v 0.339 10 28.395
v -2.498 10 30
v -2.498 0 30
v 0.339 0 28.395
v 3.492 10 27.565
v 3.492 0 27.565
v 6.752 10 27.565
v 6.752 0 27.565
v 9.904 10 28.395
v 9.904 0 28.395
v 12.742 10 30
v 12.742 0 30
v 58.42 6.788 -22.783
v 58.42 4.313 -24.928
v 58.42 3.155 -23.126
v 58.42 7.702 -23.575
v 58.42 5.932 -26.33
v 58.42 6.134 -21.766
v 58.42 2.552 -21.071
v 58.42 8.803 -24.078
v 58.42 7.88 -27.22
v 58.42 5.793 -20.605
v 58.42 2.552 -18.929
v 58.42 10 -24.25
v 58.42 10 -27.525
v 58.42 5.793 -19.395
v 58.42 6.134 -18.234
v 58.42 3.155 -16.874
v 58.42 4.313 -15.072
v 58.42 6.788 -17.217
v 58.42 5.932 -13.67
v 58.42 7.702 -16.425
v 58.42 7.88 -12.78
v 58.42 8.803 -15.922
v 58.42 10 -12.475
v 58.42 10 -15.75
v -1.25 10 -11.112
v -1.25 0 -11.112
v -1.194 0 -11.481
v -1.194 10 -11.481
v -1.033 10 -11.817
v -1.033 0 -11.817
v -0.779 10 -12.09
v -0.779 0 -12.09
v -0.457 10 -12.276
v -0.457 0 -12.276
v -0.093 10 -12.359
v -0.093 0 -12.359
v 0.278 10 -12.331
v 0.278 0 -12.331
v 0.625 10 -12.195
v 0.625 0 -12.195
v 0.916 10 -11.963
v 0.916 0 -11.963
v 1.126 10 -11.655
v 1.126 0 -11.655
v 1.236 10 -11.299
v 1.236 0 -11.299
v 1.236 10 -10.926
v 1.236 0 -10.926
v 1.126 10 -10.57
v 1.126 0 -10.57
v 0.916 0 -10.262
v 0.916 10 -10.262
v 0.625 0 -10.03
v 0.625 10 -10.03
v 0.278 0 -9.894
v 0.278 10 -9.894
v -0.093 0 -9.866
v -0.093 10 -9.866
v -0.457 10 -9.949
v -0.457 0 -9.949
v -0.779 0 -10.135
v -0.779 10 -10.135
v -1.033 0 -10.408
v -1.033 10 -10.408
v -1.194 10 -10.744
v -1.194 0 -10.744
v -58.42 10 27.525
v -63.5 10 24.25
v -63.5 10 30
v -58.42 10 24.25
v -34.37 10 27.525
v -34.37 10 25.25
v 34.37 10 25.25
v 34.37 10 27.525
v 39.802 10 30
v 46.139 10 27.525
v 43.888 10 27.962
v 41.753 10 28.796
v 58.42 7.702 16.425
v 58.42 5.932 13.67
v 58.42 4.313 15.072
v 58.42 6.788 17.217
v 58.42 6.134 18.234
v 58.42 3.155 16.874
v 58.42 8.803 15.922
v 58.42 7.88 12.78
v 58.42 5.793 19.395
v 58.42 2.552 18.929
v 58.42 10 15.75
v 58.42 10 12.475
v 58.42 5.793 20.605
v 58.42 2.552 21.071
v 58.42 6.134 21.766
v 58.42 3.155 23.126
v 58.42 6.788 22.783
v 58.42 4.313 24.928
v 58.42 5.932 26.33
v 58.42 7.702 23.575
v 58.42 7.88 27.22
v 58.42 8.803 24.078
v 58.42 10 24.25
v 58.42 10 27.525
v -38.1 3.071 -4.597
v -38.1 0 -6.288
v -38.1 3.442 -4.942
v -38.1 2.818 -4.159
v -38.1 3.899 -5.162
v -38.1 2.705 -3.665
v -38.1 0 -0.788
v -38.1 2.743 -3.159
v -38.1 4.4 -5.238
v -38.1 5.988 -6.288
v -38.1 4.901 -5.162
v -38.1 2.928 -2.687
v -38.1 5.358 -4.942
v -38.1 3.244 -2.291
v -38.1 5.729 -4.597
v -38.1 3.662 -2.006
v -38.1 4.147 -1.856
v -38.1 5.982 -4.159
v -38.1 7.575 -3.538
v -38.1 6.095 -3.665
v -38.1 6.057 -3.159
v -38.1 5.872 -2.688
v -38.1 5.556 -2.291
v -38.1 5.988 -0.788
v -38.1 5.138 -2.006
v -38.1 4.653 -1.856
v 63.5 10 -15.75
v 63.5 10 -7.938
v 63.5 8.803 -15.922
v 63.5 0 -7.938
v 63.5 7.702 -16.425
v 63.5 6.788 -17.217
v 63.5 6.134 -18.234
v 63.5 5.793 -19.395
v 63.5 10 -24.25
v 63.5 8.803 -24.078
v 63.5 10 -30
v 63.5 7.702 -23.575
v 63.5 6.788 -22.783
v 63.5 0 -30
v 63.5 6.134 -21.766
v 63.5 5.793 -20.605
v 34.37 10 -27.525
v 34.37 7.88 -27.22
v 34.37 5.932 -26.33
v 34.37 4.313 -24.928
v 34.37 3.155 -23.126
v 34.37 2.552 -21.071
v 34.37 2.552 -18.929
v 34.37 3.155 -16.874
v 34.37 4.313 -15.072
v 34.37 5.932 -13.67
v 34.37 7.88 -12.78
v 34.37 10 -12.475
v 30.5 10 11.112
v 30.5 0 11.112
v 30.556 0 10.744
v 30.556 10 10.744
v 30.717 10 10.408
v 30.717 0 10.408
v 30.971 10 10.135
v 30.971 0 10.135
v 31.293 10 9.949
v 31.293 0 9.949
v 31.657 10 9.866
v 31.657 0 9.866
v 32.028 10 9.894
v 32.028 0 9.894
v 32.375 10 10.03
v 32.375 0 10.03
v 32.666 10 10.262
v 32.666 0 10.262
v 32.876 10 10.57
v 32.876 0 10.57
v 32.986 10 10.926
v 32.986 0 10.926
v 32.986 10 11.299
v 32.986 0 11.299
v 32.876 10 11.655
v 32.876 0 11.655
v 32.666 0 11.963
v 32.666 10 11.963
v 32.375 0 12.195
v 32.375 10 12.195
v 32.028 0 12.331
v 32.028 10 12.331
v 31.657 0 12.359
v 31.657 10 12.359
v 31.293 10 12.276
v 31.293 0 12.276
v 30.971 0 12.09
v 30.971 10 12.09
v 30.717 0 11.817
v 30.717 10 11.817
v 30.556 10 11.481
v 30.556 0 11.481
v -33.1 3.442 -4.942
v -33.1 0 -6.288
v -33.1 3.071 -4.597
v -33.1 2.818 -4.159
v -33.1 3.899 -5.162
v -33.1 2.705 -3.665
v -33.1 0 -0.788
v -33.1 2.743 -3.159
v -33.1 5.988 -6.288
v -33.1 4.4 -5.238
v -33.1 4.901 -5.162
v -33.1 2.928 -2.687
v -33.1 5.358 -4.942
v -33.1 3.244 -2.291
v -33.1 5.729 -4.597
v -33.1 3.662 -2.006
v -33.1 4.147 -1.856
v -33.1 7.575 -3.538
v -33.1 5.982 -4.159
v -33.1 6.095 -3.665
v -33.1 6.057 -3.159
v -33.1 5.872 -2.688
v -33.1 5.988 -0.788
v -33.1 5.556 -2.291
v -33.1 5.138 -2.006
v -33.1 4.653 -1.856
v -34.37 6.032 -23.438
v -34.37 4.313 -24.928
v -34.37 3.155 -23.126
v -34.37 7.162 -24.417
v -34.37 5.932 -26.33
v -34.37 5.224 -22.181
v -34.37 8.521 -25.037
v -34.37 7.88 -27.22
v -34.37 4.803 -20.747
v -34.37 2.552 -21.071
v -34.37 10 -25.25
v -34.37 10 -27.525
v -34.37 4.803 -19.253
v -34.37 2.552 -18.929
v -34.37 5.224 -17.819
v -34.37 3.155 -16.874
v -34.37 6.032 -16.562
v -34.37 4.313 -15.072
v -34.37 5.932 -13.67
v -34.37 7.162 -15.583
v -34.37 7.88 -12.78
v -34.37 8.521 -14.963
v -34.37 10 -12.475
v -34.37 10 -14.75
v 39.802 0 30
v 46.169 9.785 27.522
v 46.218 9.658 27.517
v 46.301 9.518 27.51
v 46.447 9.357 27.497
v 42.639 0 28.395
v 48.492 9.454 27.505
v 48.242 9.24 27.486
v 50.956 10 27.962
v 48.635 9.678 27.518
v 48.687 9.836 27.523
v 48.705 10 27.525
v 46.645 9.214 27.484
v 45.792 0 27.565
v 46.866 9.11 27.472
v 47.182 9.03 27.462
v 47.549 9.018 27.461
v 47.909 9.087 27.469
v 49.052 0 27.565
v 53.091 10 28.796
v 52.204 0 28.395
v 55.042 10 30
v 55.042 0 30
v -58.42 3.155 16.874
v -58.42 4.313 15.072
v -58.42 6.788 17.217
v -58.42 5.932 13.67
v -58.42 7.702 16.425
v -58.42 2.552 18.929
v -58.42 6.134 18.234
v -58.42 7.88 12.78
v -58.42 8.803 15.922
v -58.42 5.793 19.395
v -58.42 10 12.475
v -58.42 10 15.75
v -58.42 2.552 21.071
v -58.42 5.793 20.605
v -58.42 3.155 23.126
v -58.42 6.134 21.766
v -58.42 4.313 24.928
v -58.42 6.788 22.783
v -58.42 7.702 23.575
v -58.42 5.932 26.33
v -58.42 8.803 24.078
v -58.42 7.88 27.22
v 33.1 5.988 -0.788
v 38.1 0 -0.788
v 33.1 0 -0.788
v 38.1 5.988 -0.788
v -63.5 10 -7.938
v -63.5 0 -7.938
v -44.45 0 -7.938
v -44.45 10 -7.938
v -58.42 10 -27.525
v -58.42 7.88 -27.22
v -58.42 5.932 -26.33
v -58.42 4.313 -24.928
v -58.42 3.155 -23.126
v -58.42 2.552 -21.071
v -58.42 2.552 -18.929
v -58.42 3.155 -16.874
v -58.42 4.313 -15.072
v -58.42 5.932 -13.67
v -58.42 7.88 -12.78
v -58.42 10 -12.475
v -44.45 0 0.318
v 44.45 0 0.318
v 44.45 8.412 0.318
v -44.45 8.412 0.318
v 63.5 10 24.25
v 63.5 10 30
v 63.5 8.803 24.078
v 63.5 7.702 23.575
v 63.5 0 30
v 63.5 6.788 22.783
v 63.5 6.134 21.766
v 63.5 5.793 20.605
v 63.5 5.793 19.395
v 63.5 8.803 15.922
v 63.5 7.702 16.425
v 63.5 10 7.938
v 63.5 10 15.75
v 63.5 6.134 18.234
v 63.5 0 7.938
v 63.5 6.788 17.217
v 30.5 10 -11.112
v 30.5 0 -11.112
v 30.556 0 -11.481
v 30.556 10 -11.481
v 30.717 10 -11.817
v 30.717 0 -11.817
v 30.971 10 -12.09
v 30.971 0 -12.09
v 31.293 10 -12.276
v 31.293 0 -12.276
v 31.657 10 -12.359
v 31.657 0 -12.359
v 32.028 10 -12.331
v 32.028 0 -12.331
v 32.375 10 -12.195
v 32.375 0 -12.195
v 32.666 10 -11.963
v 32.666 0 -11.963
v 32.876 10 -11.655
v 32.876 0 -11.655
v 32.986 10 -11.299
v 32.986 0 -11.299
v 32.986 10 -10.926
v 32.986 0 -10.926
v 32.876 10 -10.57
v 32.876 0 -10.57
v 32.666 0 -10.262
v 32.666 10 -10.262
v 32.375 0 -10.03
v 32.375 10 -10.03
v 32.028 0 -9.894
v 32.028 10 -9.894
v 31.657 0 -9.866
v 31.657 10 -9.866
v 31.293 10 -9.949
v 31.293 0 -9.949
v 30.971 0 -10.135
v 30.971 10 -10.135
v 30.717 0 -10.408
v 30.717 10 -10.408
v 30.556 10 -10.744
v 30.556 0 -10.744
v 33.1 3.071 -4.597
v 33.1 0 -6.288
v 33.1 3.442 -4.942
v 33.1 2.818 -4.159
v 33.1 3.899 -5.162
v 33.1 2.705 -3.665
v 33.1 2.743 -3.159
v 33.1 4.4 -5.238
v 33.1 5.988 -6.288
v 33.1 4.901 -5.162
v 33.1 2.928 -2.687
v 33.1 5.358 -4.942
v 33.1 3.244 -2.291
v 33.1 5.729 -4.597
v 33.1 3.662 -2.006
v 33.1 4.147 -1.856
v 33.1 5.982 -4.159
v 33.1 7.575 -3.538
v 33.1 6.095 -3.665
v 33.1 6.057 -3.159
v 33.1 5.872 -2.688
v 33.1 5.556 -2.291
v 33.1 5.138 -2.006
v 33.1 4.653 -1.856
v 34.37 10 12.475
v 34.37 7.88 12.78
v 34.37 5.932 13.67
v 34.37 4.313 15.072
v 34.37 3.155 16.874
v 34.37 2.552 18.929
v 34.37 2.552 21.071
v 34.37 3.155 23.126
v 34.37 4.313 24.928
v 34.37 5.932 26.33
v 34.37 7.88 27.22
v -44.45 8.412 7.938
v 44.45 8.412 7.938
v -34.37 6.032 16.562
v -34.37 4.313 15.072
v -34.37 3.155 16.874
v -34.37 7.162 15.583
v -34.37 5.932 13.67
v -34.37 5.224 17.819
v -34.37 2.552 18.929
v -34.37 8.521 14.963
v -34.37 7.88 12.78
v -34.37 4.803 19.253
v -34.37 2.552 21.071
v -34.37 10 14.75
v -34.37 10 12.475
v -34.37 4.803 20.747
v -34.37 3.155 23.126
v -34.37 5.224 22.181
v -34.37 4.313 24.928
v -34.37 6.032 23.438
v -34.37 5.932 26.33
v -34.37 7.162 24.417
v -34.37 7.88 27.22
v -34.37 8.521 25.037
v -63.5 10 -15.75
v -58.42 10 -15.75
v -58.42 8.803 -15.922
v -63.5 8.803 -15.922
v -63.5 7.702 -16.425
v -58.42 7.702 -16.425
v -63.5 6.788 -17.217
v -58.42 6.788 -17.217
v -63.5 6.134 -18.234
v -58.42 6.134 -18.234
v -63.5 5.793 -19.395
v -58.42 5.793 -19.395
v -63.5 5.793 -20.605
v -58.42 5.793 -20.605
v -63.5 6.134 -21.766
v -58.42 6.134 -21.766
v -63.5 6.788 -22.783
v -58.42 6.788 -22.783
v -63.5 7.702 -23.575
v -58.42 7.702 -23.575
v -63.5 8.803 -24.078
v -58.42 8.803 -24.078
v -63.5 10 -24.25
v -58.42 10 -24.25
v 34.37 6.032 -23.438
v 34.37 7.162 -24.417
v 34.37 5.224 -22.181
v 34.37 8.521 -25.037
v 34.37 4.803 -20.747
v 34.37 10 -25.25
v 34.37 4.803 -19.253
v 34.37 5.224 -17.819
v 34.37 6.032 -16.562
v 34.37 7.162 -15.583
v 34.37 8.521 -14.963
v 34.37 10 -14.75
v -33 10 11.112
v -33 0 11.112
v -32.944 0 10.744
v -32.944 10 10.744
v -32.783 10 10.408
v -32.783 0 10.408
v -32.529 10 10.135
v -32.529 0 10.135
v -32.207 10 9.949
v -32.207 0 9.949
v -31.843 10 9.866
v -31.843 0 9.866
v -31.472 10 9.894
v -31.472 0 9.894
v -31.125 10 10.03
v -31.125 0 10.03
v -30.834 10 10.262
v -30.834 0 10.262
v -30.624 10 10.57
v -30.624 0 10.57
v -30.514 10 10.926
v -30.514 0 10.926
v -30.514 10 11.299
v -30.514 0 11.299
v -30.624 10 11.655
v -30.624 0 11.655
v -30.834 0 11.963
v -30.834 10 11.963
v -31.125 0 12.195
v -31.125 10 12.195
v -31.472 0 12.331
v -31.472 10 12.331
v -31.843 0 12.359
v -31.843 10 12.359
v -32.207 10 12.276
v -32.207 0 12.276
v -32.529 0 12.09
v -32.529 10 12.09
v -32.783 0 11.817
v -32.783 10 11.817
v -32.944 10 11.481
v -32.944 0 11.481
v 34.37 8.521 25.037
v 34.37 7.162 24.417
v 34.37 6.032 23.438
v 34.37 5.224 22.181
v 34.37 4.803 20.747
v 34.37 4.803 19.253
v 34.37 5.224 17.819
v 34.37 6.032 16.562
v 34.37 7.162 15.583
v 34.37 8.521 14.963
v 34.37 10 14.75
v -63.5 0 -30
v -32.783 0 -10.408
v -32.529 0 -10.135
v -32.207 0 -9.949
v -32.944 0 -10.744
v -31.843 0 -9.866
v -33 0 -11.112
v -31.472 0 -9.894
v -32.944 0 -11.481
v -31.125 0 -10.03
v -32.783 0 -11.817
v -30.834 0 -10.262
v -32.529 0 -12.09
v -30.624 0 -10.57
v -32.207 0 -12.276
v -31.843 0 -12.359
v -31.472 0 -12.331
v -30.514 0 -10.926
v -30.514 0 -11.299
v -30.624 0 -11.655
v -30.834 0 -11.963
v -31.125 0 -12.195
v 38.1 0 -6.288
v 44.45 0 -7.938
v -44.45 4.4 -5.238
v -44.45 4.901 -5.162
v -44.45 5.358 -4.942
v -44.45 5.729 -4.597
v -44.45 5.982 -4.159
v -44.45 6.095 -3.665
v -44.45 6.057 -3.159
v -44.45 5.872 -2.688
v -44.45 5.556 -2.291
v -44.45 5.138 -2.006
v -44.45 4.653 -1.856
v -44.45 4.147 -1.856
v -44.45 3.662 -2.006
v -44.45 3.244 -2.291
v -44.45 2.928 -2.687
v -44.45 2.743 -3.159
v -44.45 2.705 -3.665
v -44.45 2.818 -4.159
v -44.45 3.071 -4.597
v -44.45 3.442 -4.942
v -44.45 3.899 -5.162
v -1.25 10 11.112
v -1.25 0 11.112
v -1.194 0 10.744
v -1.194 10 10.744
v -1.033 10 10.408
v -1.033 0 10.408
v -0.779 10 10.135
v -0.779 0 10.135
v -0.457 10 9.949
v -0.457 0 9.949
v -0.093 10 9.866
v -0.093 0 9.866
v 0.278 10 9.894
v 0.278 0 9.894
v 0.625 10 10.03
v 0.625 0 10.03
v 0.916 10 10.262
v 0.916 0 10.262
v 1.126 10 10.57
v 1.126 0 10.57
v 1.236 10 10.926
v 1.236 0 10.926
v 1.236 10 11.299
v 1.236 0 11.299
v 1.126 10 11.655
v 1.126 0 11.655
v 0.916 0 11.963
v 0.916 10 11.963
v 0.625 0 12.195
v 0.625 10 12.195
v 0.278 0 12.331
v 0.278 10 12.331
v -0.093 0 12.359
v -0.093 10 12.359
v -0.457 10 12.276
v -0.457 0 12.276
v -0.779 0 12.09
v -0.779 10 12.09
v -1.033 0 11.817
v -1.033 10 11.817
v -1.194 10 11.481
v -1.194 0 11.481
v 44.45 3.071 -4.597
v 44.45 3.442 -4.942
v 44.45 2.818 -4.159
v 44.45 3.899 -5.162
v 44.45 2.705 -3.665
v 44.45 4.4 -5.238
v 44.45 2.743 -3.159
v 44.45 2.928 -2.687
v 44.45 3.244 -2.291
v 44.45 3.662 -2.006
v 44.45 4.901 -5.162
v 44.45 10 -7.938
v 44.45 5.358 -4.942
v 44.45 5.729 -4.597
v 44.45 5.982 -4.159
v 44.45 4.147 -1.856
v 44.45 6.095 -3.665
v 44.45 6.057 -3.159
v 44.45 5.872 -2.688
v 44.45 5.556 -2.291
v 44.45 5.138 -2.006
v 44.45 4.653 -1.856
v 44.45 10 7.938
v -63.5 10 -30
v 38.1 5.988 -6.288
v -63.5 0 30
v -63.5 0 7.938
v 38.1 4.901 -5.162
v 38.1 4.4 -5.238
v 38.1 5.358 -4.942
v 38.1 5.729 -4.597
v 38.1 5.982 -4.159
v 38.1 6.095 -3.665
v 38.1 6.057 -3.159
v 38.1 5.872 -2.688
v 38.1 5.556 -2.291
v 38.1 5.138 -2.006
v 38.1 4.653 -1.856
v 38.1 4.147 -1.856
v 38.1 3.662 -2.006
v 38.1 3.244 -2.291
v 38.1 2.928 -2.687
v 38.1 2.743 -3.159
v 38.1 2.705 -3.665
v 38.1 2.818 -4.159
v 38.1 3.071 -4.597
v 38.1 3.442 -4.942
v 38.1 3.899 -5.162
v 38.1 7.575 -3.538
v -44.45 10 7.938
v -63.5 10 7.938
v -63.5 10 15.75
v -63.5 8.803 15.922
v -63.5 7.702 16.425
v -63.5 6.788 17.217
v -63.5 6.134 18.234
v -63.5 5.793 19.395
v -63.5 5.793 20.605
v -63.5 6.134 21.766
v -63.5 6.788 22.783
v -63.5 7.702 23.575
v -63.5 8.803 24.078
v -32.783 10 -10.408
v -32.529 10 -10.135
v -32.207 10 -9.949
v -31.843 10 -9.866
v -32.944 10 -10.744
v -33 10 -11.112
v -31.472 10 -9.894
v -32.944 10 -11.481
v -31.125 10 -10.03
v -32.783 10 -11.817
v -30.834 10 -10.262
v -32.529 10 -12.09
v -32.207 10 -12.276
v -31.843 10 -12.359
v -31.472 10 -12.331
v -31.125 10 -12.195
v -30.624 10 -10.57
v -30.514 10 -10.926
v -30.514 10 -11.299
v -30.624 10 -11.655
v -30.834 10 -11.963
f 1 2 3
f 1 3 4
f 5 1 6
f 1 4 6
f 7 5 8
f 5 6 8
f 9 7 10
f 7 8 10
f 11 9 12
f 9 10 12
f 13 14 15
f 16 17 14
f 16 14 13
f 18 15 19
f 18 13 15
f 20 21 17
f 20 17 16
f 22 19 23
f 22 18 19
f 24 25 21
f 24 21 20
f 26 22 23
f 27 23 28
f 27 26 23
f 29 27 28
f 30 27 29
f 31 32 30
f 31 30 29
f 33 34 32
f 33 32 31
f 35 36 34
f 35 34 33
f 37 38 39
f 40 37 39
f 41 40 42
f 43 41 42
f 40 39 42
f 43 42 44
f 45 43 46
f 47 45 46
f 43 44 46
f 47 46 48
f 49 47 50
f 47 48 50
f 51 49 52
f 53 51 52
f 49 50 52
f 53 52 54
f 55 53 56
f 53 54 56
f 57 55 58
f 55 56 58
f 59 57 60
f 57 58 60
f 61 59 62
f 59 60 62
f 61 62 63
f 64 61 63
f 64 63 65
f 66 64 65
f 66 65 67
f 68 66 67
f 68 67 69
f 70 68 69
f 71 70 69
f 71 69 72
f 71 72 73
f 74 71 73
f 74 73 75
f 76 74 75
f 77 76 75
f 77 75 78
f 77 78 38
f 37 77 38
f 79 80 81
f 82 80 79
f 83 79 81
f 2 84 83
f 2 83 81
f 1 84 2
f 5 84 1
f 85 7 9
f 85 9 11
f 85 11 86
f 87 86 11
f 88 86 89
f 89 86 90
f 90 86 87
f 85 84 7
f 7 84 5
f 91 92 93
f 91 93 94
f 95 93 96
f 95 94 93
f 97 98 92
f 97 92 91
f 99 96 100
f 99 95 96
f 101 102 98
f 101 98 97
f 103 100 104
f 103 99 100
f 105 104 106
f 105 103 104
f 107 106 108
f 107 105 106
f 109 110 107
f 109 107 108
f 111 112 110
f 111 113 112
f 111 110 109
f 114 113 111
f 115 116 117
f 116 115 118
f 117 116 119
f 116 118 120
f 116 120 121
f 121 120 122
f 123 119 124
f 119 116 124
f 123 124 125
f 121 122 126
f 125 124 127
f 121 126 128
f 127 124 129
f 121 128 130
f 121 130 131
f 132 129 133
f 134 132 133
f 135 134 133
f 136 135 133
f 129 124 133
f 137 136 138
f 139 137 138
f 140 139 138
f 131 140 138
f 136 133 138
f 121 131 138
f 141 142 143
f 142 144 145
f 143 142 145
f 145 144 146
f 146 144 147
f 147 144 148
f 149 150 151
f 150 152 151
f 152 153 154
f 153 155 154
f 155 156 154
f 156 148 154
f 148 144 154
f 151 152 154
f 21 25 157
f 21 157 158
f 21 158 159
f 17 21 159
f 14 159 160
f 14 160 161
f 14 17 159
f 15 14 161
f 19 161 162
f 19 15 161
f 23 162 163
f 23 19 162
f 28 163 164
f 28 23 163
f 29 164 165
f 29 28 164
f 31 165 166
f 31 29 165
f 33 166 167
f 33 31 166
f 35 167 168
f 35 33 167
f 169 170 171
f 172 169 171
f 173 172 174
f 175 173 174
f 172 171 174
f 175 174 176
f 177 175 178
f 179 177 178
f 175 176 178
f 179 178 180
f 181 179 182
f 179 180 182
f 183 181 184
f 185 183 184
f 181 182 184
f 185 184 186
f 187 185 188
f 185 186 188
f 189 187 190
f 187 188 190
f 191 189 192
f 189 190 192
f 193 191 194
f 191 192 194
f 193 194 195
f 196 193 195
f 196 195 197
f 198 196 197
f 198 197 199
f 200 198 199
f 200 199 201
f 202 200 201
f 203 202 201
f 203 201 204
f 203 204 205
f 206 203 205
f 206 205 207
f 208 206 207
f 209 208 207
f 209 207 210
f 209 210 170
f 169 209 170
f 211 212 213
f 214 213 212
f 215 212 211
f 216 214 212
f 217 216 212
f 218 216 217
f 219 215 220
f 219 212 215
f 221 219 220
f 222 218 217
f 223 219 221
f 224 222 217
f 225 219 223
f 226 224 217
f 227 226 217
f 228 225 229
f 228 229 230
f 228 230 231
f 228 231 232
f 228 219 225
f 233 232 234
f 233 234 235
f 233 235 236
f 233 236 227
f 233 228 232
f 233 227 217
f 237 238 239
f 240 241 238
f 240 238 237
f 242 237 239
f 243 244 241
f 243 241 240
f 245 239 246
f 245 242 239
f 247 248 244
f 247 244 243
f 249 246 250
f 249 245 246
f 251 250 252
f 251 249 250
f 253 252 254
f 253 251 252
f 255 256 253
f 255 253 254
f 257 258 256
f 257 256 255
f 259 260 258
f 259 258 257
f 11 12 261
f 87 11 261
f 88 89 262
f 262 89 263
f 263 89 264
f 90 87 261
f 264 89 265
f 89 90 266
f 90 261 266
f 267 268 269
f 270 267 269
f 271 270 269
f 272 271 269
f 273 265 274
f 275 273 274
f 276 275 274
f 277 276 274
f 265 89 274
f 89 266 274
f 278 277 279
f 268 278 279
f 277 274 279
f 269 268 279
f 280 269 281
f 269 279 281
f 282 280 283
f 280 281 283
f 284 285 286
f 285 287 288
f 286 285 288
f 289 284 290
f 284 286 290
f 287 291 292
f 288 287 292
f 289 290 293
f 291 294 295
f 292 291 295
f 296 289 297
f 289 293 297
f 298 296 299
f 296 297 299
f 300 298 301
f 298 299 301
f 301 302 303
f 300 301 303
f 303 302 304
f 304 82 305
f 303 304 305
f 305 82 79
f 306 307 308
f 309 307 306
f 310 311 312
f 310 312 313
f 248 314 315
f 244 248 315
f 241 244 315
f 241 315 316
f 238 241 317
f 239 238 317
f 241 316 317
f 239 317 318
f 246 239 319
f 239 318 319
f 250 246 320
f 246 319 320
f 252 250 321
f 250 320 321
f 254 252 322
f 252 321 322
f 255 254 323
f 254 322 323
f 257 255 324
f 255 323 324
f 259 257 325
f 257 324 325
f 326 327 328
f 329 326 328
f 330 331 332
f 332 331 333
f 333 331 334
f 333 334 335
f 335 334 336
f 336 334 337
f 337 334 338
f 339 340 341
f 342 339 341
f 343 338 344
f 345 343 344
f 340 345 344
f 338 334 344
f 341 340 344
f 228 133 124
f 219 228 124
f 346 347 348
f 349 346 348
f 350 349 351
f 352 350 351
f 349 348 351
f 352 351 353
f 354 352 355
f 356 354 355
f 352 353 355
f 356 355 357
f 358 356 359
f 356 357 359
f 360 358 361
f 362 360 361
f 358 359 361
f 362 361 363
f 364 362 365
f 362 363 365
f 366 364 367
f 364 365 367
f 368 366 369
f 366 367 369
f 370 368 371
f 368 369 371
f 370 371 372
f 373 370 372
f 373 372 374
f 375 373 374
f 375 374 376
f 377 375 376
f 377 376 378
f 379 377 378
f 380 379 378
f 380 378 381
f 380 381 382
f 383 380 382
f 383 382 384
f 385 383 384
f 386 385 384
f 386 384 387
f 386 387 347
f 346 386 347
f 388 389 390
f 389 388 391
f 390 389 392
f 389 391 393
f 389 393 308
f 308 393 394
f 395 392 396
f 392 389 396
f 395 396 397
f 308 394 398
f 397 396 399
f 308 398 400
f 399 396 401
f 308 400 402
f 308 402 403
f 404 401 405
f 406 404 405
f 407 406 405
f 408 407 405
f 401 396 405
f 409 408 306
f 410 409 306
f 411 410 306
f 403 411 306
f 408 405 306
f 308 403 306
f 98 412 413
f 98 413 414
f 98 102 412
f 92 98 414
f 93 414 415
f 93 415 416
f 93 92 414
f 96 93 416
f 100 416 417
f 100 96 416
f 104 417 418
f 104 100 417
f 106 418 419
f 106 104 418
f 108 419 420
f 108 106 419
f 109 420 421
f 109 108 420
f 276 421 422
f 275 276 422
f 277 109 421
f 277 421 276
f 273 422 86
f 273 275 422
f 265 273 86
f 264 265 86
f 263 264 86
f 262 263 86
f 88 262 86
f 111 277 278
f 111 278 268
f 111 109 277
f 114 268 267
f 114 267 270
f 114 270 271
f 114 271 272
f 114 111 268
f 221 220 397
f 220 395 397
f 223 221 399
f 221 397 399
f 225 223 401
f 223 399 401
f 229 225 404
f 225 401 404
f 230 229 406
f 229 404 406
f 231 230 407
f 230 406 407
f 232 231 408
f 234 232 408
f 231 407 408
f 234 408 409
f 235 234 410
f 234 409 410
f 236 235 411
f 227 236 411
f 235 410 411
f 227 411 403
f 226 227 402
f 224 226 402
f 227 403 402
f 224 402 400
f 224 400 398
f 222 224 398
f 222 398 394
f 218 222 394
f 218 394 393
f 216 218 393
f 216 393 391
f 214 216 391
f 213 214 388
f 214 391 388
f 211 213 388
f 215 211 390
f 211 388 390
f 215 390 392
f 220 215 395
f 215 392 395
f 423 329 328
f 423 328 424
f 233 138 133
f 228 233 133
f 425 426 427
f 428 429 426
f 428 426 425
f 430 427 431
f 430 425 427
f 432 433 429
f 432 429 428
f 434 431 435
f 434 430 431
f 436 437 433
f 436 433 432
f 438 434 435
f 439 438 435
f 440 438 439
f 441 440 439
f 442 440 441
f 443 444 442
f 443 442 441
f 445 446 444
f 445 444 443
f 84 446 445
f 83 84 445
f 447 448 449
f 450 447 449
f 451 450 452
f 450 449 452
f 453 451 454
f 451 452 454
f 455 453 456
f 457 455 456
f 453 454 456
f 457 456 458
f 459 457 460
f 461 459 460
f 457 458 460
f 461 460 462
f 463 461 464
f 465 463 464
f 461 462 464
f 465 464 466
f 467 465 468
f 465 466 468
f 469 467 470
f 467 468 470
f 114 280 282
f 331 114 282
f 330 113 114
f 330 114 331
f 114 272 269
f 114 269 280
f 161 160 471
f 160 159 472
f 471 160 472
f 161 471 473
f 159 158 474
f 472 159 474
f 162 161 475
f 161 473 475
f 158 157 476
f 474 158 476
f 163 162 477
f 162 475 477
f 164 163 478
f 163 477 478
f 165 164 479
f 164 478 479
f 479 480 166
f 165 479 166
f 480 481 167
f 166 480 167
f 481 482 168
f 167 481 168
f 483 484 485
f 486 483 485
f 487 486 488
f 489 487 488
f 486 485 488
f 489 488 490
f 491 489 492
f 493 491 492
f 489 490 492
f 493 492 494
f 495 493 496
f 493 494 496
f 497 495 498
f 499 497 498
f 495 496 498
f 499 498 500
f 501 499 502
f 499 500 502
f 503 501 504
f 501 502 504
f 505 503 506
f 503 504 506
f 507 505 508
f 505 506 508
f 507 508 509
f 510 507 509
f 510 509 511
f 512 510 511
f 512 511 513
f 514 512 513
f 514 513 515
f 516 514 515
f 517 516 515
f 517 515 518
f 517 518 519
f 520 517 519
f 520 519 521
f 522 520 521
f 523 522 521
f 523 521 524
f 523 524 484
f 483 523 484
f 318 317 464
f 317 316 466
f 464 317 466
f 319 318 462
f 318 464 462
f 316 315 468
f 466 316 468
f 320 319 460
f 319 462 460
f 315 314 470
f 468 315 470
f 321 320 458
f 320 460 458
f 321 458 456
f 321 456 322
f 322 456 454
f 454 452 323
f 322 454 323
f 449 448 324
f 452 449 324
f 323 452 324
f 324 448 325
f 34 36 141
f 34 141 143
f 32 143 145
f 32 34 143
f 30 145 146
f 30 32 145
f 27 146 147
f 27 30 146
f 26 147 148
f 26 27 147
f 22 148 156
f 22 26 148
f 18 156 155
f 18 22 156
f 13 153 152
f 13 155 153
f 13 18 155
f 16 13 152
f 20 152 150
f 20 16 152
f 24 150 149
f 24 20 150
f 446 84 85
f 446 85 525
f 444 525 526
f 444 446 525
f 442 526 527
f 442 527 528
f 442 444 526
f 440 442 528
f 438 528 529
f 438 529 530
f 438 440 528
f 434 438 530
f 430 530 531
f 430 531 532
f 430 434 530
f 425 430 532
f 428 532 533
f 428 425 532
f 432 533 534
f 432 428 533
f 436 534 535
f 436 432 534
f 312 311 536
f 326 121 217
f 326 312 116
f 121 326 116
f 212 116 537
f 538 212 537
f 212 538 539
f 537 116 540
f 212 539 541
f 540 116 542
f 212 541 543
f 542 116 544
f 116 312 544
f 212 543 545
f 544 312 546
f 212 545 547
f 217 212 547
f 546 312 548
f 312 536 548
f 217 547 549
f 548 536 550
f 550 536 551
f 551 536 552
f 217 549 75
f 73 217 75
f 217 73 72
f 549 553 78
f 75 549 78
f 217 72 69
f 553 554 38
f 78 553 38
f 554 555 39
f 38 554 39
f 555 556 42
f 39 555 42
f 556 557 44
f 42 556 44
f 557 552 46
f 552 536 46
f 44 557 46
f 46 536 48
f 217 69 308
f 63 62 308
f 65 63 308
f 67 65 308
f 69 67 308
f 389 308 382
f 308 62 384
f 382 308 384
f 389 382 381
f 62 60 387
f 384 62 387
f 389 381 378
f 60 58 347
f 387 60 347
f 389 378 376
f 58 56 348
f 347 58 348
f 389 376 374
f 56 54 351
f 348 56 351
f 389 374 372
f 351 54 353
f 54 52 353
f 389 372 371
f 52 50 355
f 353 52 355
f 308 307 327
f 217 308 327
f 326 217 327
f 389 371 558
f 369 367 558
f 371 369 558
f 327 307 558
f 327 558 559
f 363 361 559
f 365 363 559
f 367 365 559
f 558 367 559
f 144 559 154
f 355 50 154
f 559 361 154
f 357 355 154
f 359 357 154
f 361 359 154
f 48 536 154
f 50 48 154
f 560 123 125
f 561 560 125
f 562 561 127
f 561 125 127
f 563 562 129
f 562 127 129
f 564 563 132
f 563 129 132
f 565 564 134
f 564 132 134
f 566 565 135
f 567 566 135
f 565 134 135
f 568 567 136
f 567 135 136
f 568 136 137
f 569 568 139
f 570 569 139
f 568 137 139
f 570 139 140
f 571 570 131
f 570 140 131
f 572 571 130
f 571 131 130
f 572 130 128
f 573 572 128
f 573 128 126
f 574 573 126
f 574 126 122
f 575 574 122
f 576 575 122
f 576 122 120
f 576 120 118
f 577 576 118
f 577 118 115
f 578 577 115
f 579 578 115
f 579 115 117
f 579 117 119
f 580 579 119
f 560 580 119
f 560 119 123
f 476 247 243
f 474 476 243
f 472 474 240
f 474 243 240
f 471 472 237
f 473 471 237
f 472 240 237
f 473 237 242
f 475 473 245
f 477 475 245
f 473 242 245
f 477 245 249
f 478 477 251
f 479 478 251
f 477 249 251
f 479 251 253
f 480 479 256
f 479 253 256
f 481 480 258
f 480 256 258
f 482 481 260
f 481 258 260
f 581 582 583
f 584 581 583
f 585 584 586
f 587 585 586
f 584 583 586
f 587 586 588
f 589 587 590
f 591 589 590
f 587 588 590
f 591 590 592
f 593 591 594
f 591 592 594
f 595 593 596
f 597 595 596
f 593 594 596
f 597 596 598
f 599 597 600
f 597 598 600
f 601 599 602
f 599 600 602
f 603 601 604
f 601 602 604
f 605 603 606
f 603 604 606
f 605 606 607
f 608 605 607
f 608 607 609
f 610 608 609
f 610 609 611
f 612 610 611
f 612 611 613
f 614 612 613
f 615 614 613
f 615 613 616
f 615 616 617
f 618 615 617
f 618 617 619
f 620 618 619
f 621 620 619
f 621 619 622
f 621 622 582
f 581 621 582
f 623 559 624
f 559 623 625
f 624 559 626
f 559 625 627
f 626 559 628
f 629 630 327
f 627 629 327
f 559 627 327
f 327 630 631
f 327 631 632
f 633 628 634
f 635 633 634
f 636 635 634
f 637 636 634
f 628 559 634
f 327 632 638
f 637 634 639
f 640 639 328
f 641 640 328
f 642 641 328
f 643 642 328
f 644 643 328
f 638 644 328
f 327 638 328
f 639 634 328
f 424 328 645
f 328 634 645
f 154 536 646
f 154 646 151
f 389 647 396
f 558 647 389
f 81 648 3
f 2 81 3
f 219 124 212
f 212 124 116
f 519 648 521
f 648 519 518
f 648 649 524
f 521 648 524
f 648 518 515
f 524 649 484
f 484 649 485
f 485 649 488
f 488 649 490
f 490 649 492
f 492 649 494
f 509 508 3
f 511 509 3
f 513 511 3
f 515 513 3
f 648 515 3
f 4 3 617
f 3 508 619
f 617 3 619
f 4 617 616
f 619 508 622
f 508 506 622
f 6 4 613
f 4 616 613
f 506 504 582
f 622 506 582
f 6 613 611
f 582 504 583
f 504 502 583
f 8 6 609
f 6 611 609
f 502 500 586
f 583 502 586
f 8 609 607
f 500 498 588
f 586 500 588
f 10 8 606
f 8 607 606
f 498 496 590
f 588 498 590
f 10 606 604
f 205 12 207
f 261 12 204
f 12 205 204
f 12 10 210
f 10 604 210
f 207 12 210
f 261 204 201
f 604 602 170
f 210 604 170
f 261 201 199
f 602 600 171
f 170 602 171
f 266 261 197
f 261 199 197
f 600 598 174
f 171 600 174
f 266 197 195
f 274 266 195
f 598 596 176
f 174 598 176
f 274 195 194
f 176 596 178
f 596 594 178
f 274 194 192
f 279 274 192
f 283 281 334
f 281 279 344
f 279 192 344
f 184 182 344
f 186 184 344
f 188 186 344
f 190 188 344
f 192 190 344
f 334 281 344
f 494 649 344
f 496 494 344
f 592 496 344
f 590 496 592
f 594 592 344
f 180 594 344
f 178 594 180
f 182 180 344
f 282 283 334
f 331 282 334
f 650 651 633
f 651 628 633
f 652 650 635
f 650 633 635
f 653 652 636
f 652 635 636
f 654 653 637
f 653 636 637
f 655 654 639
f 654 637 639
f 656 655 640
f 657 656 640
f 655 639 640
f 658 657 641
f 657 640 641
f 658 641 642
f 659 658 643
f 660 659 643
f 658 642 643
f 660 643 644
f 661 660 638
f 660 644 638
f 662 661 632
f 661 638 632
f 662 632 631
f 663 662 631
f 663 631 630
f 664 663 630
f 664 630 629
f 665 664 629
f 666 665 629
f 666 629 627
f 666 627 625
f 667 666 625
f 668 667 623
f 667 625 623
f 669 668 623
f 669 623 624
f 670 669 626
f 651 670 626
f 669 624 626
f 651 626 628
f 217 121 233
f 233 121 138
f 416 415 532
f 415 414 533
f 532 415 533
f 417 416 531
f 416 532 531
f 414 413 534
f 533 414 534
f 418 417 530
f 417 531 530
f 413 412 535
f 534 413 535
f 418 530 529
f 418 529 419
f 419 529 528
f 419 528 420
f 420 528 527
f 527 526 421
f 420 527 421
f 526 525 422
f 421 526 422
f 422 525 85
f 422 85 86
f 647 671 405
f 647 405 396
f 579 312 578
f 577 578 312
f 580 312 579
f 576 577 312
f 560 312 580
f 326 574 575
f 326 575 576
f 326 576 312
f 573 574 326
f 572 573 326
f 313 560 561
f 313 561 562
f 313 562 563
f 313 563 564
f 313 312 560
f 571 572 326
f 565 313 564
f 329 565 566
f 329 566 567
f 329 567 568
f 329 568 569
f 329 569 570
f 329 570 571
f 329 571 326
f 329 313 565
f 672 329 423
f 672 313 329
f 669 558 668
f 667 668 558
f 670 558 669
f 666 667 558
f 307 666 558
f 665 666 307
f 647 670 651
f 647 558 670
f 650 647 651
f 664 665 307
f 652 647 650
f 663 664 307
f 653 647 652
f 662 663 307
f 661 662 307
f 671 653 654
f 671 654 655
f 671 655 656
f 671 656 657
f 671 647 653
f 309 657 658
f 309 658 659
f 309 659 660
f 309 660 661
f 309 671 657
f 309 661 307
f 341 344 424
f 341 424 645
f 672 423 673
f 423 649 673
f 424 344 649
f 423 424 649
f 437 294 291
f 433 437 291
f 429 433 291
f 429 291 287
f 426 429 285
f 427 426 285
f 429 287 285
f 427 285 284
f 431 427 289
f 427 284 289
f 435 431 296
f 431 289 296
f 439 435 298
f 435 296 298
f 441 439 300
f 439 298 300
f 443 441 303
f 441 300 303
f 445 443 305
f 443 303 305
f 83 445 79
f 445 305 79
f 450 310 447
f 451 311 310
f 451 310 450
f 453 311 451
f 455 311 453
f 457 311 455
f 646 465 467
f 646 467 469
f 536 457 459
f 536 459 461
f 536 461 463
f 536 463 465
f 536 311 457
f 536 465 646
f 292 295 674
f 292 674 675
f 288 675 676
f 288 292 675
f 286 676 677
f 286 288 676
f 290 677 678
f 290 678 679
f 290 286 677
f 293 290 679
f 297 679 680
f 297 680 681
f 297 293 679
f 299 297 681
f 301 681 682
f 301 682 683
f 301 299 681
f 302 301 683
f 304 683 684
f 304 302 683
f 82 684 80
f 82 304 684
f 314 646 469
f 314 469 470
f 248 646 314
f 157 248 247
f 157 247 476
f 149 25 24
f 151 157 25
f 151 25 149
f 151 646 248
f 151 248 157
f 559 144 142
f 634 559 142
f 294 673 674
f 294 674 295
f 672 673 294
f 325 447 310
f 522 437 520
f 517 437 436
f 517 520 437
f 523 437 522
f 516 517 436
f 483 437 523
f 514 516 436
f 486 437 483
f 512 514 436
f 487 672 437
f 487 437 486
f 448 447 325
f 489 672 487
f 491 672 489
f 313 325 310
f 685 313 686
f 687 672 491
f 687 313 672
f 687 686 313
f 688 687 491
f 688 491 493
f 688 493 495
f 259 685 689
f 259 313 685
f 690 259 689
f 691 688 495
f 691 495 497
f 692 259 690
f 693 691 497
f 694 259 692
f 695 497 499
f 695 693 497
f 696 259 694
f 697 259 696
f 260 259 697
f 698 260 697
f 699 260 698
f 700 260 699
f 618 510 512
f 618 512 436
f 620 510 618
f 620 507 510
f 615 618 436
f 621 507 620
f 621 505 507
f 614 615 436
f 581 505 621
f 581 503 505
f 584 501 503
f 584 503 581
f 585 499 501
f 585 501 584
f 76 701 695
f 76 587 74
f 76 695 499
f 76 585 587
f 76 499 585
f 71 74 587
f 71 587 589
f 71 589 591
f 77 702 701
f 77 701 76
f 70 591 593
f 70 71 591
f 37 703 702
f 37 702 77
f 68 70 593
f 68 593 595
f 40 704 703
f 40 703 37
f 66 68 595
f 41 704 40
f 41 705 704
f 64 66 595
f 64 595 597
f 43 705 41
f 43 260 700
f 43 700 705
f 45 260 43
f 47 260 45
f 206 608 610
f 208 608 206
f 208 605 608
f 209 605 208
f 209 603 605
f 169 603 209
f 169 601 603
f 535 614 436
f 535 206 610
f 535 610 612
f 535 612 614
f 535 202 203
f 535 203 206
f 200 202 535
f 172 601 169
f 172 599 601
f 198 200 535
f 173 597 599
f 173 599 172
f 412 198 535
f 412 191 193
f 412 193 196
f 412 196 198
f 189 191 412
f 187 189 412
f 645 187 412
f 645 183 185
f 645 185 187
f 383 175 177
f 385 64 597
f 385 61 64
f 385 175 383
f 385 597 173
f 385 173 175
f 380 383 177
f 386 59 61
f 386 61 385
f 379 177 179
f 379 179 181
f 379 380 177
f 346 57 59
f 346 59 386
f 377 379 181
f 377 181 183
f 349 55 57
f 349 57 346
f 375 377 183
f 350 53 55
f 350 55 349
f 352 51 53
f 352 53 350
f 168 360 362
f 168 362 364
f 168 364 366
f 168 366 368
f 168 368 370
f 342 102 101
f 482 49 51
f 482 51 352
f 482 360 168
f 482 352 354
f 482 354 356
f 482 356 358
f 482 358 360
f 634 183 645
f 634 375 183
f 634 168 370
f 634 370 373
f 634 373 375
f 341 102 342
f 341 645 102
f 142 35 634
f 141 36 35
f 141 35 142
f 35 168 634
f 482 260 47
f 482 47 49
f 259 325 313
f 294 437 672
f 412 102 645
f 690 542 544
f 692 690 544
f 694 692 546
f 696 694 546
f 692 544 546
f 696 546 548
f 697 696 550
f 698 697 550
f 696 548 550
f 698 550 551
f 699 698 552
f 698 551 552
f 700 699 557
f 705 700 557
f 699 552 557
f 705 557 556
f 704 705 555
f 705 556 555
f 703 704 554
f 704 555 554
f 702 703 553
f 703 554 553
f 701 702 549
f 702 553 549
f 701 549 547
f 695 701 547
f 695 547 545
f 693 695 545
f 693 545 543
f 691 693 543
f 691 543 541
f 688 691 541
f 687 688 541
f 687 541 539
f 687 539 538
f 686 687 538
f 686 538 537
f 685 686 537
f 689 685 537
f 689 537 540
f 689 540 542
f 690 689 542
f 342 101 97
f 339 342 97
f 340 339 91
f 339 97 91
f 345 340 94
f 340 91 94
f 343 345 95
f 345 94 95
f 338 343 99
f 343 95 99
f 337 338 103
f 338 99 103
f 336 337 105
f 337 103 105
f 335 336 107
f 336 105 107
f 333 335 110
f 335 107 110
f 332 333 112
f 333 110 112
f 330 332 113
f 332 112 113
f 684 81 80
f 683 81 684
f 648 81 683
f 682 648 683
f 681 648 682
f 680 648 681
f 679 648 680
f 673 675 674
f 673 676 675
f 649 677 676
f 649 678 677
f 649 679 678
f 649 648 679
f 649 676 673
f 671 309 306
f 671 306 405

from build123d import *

# Parameters (mm, degrees)
SKETCH1_W                      = 127
SKETCH1_H                      = 60
BOSS_EXTRUDE1_DEPTH            = 10
CUT_EXTRUDE1_START             = -5.08
SKETCH3_R                      = 7.525
CUT_EXTRUDE1_DEPTH             = 24.05
CUT_EXTRUDE2_REACH             = 127.954
SKETCH4_R                      = 4.25
CUT_EXTRUDE2_DIRECTION_2_REACH = 127.954
CUT_EXTRUDE3_START             = -68.74
SKETCH5_R                      = 5.25
SKETCH5_R_2                    = 4.25
CUT_EXTRUDE3_DEPTH             = 68.74
SKETCH6_W                      = 15.875
SKETCH6_H                      = 10
CUT_EXTRUDE4_DEPTH             = 19.05
M3_CLEARANCE_HOLE1_D           = 3.4
CUT_EXTRUDE5_START             = -6.35
CUT_EXTRUDE5_DEPTH             = 5
M3X0_5_TAPPED_HOLE1_D          = 2.5
SKETCH12_W                     = 7.62
SKETCH12_H                     = 8.4125
CUT_EXTRUDE6_DEPTH             = 113.48645474
CUT_EXTRUDE7_REACH             = 72.938
SKETCH13_R                     = 12.7


with BuildPart() as part:
    # Sketch1 → Boss-Extrude1 (new body)
    with BuildSketch(Plane(origin=(0, 0, 0), x_dir=(1, 0, 0), z_dir=(0, 1, 0))):
        Rectangle(SKETCH1_W, SKETCH1_H)
    extrude(amount=BOSS_EXTRUDE1_DEPTH)

    # Sketch3 → Cut-Extrude1 (cut)
    with BuildSketch(Plane.ZY.offset(63.5).offset(CUT_EXTRUDE1_START)):
        with Locations((-20, 10)):
            Circle(SKETCH3_R)
        with Locations((20, 10)):
            Circle(SKETCH3_R)
    cut_extrude1 = extrude(amount=-CUT_EXTRUDE1_DEPTH, mode=Mode.SUBTRACT)

    # Mirror1: Cut-Extrude1 across plane
    add(cut_extrude1.mirror(Plane(origin=(0, 0, 0), x_dir=(0, 0, 1), z_dir=(1, 0, 0))), mode=Mode.SUBTRACT)

    # Sketch4 → Cut-Extrude2 (cut, up to next)
    with BuildSketch(Plane(origin=(-58.42, 0, 0), x_dir=(0, 0, -1), z_dir=(1, 0, 0)), mode=Mode.PRIVATE) as cut_extrude2_sk1:
        with Locations((20, 10)):
            Circle(SKETCH4_R)
    cut_extrude2_tool1 = extrude(cut_extrude2_sk1.sketch, amount=-CUT_EXTRUDE2_REACH, mode=Mode.PRIVATE) & part.part
    cut_extrude2 = cut_extrude2_tool1.solids().sort_by_distance((-58.42, 10, -20))[0]
    add(cut_extrude2, mode=Mode.SUBTRACT)

    # Cut-Extrude2 direction 2: up to this face of the body (flat: up to its plane)
    cut_extrude2_direction_2_end = Plane(part.part.faces().sort_by_distance((63.5, 5, 0))[0])
    # Sketch4 → Cut-Extrude2 direction 2 (cut, up to the picked face)
    with BuildSketch(Plane(origin=(-58.42, 0, 0), x_dir=(0, 0, -1), z_dir=(1, 0, 0)), mode=Mode.PRIVATE) as cut_extrude2_direction_2_sk1:
        with Locations((20, 10)):
            Circle(SKETCH4_R)
    cut_extrude2_direction_2_tool1 = split(extrude(cut_extrude2_direction_2_sk1.sketch, amount=CUT_EXTRUDE2_DIRECTION_2_REACH, mode=Mode.PRIVATE), bisect_by=cut_extrude2_direction_2_end, keep=Keep.BOTH, mode=Mode.PRIVATE)
    cut_extrude2_direction_2 = cut_extrude2_direction_2_tool1.solids().sort_by(Axis((-58.42, 10, -20), (1, 0, 0)))[0]
    add(cut_extrude2_direction_2, mode=Mode.SUBTRACT)

    # Mirror2: Cut-Extrude2, Cut-Extrude2 direction 2 across plane
    add(cut_extrude2.mirror(Plane.XY), mode=Mode.SUBTRACT)
    add(cut_extrude2_direction_2.mirror(Plane.XY), mode=Mode.SUBTRACT)

    # Sketch5 → Cut-Extrude3 (cut)
    with BuildSketch(Plane(origin=(34.37, 0, 0), x_dir=(0, 0, -1), z_dir=(1, 0, 0)).offset(CUT_EXTRUDE3_START)):
        with Locations((-20, 10)):
            Circle(SKETCH5_R)
        with Locations((-20, 10)):
            Circle(SKETCH5_R_2, mode=Mode.SUBTRACT)
    cut_extrude3 = extrude(amount=CUT_EXTRUDE3_DEPTH, mode=Mode.SUBTRACT)

    # Mirror3: Cut-Extrude3 across plane
    add(cut_extrude3.mirror(Plane.XY), mode=Mode.SUBTRACT)

    # Sketch6 → Cut-Extrude4 (cut)
    with BuildSketch(Plane.ZY.offset(63.5)):
        with Locations((0, 5)):
            Rectangle(SKETCH6_W, SKETCH6_H)
    cut_extrude4 = extrude(amount=-CUT_EXTRUDE4_DEPTH, mode=Mode.SUBTRACT)

    # Mirror4: Cut-Extrude4 across plane
    add(cut_extrude4.mirror(Plane(origin=(0, 0, 0), x_dir=(0, 0, 1), z_dir=(1, 0, 0))), mode=Mode.SUBTRACT)

    # M3 Clearance Hole1 (through all)
    with Locations(Plane.ZY.offset(44.45)):
        with Locations((-3.5375, 4.4)):
            Hole(M3_CLEARANCE_HOLE1_D / 2)

    # Sketch9 → Cut-Extrude5 (cut)
    with BuildSketch(Plane.ZY.offset(44.45).offset(CUT_EXTRUDE5_START)):
        Polygon((-0.7875, 0), (-0.7875, 5.98771324), (-3.5375, 7.575426481), (-6.2875, 5.98771324), (-6.2875, 0), align=None)
    cut_extrude5 = extrude(amount=-CUT_EXTRUDE5_DEPTH, mode=Mode.SUBTRACT)

    # Mirror5: Cut-Extrude5 across plane
    add(cut_extrude5.mirror(Plane(origin=(0, 0, 0), x_dir=(0, 0, 1), z_dir=(1, 0, 0))), mode=Mode.SUBTRACT)

    # M3x0.5 Tapped Hole1 (through all)
    with Locations(Plane(origin=(0, 10, 0), x_dir=(1, 0, 0), z_dir=(0, 1, 0))):
        with Locations((-31.75, -11.1125), (31.75, -11.1125), (-31.75, 11.1125), (31.75, 11.1125), (0, -11.1125), (0, 11.1125)):
            Hole(M3X0_5_TAPPED_HOLE1_D / 2)

    # Sketch12 → Cut-Extrude6 (cut, through all)
    with BuildSketch(Plane.ZY.offset(44.45)):
        with Locations((4.1275, 4.20625)):
            Rectangle(SKETCH12_W, SKETCH12_H)
    extrude(amount=-CUT_EXTRUDE6_DEPTH, mode=Mode.SUBTRACT)

    # Sketch13 → Cut-Extrude7 (cut, up to next)
    with BuildSketch(Plane.XZ, mode=Mode.PRIVATE) as cut_extrude7_sk1:
        with Locations((5.1218, 40.16)):
            Circle(SKETCH13_R)
    cut_extrude7_tool1 = extrude(cut_extrude7_sk1.sketch, amount=-CUT_EXTRUDE7_REACH, mode=Mode.PRIVATE) & part.part
    # Sketch13 → Cut-Extrude7 (cut, up to next)
    with BuildSketch(Plane.XZ, mode=Mode.PRIVATE) as cut_extrude7_sk2:
        with Locations((47.4218, 40.16)):
            Circle(SKETCH13_R)
    cut_extrude7_tool2 = extrude(cut_extrude7_sk2.sketch, amount=-CUT_EXTRUDE7_REACH, mode=Mode.PRIVATE) & part.part
    add(cut_extrude7_tool1.solids().sort_by_distance((5.1218, 0, 40.16))[0], mode=Mode.SUBTRACT)
    add(cut_extrude7_tool2.solids().sort_by_distance((47.4218, 0, 40.16))[0], mode=Mode.SUBTRACT)


solid = part.part
